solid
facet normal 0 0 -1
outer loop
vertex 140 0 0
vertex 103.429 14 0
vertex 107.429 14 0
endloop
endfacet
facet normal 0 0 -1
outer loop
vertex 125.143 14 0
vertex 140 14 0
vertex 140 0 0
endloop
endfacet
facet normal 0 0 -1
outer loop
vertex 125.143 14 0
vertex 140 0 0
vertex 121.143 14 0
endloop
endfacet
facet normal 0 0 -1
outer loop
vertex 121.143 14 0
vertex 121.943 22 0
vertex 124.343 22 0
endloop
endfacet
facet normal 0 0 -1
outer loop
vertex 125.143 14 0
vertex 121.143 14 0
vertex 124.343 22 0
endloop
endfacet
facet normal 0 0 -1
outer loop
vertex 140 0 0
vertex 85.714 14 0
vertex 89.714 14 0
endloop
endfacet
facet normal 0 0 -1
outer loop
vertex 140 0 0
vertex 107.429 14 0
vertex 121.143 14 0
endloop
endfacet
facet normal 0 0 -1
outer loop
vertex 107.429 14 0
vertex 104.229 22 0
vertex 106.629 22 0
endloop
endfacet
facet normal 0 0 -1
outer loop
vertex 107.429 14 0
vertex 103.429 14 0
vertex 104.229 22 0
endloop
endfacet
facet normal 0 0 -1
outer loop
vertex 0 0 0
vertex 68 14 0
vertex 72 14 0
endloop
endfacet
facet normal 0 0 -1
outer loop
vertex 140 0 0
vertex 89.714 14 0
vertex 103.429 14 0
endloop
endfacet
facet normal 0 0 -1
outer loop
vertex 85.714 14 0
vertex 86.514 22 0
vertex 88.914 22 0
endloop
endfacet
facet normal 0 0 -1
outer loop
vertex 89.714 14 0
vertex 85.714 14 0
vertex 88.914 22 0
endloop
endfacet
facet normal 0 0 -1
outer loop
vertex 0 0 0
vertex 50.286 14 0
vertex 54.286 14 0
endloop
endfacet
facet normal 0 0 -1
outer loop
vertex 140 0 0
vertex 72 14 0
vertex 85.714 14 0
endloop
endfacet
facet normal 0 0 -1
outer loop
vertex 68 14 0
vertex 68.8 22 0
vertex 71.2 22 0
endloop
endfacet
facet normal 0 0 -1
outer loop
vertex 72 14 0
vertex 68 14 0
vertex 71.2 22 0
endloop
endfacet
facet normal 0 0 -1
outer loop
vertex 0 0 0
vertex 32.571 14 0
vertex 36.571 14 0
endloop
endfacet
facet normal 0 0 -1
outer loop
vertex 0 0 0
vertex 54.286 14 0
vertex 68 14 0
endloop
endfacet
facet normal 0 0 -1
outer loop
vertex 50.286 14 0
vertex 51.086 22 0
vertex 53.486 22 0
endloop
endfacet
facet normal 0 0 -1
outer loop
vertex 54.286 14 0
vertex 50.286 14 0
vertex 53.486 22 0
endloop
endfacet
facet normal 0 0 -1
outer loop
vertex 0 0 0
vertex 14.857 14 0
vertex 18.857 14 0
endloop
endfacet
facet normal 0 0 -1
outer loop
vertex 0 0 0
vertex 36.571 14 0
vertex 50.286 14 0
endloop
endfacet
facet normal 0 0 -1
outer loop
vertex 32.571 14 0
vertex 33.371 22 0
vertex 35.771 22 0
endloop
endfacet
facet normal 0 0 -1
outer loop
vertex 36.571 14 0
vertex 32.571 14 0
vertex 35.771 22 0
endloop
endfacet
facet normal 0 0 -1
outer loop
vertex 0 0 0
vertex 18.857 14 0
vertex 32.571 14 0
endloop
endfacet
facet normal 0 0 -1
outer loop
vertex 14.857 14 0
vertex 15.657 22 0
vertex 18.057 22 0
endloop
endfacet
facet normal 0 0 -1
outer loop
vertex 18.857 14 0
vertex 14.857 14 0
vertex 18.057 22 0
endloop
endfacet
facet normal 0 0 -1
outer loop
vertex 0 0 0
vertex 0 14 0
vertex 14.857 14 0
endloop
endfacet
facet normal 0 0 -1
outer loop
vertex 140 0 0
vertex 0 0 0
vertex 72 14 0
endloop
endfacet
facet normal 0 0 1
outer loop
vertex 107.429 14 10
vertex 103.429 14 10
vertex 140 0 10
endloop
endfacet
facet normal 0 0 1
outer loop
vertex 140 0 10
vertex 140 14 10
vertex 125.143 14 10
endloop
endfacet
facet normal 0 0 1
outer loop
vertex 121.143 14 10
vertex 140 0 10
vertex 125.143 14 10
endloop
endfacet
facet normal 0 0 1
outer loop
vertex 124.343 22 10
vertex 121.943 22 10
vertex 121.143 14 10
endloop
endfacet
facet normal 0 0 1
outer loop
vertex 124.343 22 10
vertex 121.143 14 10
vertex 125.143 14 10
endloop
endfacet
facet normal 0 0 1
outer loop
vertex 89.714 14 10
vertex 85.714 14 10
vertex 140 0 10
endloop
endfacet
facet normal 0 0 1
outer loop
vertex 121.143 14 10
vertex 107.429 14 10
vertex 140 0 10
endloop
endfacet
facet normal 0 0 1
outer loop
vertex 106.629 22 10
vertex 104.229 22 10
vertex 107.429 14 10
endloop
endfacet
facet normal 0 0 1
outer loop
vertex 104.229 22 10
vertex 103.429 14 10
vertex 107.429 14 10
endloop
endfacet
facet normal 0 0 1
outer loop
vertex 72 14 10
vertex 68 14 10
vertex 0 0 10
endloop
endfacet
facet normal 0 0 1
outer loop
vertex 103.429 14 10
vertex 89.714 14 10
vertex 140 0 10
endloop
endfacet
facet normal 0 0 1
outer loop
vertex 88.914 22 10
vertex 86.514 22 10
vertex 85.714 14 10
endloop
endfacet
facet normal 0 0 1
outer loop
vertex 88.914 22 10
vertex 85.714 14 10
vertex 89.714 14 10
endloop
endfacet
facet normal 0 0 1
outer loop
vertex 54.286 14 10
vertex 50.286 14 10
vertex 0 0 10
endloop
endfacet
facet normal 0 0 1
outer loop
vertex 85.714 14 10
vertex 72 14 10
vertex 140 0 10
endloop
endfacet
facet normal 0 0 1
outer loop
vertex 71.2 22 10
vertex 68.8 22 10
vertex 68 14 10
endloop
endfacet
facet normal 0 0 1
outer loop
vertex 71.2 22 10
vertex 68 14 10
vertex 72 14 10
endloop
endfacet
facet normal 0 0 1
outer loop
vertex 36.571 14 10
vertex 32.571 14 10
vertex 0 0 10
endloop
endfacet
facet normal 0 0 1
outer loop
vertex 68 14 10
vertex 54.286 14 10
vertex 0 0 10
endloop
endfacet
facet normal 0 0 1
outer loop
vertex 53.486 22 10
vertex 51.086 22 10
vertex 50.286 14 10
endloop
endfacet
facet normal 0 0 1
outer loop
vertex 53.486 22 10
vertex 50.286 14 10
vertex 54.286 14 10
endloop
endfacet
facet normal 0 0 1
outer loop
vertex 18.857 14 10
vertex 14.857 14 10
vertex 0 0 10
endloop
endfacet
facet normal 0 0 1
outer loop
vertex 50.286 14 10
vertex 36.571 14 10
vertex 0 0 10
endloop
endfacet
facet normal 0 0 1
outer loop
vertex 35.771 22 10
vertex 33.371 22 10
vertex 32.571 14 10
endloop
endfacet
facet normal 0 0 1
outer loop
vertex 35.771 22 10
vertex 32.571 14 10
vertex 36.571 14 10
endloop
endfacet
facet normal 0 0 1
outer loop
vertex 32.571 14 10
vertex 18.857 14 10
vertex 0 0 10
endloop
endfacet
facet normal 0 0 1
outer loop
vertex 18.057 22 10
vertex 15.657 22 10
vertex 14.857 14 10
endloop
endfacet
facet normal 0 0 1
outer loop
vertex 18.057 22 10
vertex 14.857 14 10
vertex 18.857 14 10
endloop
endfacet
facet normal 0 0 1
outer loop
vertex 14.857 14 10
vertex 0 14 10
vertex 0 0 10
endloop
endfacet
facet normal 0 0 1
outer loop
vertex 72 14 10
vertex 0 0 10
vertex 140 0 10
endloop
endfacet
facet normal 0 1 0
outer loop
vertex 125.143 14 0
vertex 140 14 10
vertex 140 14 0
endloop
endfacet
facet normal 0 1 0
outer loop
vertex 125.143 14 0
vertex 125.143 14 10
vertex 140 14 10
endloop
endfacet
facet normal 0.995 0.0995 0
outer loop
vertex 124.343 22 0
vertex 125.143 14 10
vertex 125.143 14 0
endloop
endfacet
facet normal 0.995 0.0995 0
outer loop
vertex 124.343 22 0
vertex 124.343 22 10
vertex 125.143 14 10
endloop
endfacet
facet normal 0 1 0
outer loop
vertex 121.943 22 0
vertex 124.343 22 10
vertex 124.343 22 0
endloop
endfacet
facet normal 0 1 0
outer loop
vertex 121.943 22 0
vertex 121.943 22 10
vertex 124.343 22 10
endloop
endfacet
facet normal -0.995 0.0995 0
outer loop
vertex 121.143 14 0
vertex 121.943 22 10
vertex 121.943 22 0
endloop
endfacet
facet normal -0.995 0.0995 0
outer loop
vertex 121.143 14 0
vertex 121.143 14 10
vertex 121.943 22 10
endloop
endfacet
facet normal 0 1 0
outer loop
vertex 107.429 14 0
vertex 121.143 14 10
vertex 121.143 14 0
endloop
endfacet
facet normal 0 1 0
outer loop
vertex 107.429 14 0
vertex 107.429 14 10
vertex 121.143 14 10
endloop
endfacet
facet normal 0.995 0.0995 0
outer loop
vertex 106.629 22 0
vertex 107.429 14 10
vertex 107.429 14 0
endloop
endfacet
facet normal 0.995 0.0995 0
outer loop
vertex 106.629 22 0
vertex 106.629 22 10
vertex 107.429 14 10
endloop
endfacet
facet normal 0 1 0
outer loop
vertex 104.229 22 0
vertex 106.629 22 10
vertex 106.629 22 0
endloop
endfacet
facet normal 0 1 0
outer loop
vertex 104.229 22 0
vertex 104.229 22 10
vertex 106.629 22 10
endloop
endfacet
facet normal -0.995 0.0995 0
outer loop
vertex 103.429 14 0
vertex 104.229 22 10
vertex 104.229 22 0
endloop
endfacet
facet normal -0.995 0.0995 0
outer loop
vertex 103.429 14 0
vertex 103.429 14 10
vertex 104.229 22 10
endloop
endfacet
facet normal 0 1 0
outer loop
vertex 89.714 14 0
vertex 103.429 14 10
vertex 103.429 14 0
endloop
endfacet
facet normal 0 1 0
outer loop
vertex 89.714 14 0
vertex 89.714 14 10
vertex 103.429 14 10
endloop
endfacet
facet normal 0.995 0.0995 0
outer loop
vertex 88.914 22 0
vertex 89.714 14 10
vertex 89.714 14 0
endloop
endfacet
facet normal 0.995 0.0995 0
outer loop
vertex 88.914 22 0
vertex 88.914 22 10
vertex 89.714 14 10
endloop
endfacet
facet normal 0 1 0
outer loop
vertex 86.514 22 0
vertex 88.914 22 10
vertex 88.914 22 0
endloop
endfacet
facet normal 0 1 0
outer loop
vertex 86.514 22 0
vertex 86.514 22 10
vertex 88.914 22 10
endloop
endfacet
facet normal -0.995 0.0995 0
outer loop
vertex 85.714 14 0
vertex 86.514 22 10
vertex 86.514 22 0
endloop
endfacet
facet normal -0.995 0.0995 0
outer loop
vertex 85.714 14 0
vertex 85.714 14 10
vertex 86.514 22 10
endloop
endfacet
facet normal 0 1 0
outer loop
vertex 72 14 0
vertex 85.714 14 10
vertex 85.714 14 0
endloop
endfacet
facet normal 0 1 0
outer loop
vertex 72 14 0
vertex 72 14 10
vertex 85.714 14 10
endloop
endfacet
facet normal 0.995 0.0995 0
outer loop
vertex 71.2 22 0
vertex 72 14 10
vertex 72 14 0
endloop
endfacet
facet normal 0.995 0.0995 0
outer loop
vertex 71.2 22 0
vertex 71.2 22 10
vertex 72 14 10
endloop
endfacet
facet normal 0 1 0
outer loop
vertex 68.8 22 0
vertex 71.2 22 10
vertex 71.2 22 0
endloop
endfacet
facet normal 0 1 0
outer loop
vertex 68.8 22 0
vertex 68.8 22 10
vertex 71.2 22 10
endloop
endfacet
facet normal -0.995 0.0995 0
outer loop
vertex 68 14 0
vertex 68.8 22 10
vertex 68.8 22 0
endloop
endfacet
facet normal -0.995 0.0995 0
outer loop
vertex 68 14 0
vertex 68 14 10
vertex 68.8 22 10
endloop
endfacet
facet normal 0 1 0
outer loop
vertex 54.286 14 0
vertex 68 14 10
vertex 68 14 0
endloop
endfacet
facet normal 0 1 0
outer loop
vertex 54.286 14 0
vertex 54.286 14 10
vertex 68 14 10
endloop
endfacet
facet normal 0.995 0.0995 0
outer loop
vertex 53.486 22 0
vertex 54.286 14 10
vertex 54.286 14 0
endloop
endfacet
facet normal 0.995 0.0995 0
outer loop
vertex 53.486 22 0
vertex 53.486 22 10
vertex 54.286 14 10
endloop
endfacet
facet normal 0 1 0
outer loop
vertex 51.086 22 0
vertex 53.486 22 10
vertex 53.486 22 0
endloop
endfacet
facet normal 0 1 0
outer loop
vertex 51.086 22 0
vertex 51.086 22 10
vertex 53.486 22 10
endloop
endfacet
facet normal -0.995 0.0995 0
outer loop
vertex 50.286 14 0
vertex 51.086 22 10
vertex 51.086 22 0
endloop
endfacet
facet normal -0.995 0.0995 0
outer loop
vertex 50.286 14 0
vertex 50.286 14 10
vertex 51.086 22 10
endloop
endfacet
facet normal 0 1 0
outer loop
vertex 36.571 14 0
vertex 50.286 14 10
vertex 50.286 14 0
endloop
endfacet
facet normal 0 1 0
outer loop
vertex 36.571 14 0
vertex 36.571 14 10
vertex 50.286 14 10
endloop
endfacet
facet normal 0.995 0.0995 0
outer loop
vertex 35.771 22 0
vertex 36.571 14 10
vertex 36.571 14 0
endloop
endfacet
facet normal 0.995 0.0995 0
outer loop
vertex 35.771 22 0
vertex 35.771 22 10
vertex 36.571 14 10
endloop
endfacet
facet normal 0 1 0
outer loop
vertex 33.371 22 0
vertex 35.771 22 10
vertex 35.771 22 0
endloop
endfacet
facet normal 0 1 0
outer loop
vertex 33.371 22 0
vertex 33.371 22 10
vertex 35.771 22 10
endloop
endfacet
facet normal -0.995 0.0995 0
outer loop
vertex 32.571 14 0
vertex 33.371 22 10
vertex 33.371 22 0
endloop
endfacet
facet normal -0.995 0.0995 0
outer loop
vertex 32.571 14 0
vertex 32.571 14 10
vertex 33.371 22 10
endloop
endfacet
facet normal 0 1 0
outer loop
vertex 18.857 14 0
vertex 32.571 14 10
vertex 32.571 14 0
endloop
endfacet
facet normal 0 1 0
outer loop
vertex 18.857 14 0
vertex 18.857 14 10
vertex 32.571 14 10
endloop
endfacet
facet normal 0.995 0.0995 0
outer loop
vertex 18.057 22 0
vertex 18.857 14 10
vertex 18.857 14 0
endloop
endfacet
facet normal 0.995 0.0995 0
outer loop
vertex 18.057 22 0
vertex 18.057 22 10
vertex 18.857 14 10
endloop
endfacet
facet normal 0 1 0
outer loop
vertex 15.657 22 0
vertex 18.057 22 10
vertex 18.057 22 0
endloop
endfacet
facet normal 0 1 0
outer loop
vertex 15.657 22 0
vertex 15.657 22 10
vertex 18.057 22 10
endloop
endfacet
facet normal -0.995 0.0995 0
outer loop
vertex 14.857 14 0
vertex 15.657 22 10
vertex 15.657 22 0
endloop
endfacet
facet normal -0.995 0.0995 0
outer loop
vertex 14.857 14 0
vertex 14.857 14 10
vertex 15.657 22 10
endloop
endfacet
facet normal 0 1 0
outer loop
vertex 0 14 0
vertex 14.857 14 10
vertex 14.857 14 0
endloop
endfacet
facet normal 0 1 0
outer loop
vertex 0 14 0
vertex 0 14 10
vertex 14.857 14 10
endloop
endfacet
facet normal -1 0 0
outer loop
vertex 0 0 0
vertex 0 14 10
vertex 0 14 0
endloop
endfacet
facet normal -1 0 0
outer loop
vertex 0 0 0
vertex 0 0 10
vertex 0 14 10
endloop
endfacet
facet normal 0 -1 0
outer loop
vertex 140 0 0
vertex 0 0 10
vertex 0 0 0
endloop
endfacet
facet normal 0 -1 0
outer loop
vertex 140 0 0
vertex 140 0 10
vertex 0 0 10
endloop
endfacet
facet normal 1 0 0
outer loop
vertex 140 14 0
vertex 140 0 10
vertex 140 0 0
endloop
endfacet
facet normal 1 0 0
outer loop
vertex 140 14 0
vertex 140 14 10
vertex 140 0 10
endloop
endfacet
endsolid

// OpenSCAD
$fn = 32;

// ----------------------------------------------------------------------
// Gear rack: 7 teeth on a 140 mm bar, pitch 17.71 mm
// ----------------------------------------------------------------------

// --- parameters (mm) ---
profile_height = 10;      // extrusion height
profile_points = 32;      // points of the closed outline

profile = [[0, 0], [140, 0], [140, 14], [125.143, 14], [124.343, 22], [121.943, 22], [121.143, 14], [107.429, 14], [106.629, 22], [104.229, 22], [103.429, 14], [89.714, 14], [88.914, 22], [86.514, 22], [85.714, 14], [72, 14], [71.2, 22], [68.8, 22], [68, 14], [54.286, 14], [53.486, 22], [51.086, 22], [50.286, 14], [36.571, 14], [35.771, 22], [33.371, 22], [32.571, 14], [18.857, 14], [18.057, 22], [15.657, 22], [14.857, 14], [0, 14]];  // single closed polygon, 32 points, counter clockwise

// --- the one profile operation ---
linear_extrude(height = profile_height) polygon(points = profile);
